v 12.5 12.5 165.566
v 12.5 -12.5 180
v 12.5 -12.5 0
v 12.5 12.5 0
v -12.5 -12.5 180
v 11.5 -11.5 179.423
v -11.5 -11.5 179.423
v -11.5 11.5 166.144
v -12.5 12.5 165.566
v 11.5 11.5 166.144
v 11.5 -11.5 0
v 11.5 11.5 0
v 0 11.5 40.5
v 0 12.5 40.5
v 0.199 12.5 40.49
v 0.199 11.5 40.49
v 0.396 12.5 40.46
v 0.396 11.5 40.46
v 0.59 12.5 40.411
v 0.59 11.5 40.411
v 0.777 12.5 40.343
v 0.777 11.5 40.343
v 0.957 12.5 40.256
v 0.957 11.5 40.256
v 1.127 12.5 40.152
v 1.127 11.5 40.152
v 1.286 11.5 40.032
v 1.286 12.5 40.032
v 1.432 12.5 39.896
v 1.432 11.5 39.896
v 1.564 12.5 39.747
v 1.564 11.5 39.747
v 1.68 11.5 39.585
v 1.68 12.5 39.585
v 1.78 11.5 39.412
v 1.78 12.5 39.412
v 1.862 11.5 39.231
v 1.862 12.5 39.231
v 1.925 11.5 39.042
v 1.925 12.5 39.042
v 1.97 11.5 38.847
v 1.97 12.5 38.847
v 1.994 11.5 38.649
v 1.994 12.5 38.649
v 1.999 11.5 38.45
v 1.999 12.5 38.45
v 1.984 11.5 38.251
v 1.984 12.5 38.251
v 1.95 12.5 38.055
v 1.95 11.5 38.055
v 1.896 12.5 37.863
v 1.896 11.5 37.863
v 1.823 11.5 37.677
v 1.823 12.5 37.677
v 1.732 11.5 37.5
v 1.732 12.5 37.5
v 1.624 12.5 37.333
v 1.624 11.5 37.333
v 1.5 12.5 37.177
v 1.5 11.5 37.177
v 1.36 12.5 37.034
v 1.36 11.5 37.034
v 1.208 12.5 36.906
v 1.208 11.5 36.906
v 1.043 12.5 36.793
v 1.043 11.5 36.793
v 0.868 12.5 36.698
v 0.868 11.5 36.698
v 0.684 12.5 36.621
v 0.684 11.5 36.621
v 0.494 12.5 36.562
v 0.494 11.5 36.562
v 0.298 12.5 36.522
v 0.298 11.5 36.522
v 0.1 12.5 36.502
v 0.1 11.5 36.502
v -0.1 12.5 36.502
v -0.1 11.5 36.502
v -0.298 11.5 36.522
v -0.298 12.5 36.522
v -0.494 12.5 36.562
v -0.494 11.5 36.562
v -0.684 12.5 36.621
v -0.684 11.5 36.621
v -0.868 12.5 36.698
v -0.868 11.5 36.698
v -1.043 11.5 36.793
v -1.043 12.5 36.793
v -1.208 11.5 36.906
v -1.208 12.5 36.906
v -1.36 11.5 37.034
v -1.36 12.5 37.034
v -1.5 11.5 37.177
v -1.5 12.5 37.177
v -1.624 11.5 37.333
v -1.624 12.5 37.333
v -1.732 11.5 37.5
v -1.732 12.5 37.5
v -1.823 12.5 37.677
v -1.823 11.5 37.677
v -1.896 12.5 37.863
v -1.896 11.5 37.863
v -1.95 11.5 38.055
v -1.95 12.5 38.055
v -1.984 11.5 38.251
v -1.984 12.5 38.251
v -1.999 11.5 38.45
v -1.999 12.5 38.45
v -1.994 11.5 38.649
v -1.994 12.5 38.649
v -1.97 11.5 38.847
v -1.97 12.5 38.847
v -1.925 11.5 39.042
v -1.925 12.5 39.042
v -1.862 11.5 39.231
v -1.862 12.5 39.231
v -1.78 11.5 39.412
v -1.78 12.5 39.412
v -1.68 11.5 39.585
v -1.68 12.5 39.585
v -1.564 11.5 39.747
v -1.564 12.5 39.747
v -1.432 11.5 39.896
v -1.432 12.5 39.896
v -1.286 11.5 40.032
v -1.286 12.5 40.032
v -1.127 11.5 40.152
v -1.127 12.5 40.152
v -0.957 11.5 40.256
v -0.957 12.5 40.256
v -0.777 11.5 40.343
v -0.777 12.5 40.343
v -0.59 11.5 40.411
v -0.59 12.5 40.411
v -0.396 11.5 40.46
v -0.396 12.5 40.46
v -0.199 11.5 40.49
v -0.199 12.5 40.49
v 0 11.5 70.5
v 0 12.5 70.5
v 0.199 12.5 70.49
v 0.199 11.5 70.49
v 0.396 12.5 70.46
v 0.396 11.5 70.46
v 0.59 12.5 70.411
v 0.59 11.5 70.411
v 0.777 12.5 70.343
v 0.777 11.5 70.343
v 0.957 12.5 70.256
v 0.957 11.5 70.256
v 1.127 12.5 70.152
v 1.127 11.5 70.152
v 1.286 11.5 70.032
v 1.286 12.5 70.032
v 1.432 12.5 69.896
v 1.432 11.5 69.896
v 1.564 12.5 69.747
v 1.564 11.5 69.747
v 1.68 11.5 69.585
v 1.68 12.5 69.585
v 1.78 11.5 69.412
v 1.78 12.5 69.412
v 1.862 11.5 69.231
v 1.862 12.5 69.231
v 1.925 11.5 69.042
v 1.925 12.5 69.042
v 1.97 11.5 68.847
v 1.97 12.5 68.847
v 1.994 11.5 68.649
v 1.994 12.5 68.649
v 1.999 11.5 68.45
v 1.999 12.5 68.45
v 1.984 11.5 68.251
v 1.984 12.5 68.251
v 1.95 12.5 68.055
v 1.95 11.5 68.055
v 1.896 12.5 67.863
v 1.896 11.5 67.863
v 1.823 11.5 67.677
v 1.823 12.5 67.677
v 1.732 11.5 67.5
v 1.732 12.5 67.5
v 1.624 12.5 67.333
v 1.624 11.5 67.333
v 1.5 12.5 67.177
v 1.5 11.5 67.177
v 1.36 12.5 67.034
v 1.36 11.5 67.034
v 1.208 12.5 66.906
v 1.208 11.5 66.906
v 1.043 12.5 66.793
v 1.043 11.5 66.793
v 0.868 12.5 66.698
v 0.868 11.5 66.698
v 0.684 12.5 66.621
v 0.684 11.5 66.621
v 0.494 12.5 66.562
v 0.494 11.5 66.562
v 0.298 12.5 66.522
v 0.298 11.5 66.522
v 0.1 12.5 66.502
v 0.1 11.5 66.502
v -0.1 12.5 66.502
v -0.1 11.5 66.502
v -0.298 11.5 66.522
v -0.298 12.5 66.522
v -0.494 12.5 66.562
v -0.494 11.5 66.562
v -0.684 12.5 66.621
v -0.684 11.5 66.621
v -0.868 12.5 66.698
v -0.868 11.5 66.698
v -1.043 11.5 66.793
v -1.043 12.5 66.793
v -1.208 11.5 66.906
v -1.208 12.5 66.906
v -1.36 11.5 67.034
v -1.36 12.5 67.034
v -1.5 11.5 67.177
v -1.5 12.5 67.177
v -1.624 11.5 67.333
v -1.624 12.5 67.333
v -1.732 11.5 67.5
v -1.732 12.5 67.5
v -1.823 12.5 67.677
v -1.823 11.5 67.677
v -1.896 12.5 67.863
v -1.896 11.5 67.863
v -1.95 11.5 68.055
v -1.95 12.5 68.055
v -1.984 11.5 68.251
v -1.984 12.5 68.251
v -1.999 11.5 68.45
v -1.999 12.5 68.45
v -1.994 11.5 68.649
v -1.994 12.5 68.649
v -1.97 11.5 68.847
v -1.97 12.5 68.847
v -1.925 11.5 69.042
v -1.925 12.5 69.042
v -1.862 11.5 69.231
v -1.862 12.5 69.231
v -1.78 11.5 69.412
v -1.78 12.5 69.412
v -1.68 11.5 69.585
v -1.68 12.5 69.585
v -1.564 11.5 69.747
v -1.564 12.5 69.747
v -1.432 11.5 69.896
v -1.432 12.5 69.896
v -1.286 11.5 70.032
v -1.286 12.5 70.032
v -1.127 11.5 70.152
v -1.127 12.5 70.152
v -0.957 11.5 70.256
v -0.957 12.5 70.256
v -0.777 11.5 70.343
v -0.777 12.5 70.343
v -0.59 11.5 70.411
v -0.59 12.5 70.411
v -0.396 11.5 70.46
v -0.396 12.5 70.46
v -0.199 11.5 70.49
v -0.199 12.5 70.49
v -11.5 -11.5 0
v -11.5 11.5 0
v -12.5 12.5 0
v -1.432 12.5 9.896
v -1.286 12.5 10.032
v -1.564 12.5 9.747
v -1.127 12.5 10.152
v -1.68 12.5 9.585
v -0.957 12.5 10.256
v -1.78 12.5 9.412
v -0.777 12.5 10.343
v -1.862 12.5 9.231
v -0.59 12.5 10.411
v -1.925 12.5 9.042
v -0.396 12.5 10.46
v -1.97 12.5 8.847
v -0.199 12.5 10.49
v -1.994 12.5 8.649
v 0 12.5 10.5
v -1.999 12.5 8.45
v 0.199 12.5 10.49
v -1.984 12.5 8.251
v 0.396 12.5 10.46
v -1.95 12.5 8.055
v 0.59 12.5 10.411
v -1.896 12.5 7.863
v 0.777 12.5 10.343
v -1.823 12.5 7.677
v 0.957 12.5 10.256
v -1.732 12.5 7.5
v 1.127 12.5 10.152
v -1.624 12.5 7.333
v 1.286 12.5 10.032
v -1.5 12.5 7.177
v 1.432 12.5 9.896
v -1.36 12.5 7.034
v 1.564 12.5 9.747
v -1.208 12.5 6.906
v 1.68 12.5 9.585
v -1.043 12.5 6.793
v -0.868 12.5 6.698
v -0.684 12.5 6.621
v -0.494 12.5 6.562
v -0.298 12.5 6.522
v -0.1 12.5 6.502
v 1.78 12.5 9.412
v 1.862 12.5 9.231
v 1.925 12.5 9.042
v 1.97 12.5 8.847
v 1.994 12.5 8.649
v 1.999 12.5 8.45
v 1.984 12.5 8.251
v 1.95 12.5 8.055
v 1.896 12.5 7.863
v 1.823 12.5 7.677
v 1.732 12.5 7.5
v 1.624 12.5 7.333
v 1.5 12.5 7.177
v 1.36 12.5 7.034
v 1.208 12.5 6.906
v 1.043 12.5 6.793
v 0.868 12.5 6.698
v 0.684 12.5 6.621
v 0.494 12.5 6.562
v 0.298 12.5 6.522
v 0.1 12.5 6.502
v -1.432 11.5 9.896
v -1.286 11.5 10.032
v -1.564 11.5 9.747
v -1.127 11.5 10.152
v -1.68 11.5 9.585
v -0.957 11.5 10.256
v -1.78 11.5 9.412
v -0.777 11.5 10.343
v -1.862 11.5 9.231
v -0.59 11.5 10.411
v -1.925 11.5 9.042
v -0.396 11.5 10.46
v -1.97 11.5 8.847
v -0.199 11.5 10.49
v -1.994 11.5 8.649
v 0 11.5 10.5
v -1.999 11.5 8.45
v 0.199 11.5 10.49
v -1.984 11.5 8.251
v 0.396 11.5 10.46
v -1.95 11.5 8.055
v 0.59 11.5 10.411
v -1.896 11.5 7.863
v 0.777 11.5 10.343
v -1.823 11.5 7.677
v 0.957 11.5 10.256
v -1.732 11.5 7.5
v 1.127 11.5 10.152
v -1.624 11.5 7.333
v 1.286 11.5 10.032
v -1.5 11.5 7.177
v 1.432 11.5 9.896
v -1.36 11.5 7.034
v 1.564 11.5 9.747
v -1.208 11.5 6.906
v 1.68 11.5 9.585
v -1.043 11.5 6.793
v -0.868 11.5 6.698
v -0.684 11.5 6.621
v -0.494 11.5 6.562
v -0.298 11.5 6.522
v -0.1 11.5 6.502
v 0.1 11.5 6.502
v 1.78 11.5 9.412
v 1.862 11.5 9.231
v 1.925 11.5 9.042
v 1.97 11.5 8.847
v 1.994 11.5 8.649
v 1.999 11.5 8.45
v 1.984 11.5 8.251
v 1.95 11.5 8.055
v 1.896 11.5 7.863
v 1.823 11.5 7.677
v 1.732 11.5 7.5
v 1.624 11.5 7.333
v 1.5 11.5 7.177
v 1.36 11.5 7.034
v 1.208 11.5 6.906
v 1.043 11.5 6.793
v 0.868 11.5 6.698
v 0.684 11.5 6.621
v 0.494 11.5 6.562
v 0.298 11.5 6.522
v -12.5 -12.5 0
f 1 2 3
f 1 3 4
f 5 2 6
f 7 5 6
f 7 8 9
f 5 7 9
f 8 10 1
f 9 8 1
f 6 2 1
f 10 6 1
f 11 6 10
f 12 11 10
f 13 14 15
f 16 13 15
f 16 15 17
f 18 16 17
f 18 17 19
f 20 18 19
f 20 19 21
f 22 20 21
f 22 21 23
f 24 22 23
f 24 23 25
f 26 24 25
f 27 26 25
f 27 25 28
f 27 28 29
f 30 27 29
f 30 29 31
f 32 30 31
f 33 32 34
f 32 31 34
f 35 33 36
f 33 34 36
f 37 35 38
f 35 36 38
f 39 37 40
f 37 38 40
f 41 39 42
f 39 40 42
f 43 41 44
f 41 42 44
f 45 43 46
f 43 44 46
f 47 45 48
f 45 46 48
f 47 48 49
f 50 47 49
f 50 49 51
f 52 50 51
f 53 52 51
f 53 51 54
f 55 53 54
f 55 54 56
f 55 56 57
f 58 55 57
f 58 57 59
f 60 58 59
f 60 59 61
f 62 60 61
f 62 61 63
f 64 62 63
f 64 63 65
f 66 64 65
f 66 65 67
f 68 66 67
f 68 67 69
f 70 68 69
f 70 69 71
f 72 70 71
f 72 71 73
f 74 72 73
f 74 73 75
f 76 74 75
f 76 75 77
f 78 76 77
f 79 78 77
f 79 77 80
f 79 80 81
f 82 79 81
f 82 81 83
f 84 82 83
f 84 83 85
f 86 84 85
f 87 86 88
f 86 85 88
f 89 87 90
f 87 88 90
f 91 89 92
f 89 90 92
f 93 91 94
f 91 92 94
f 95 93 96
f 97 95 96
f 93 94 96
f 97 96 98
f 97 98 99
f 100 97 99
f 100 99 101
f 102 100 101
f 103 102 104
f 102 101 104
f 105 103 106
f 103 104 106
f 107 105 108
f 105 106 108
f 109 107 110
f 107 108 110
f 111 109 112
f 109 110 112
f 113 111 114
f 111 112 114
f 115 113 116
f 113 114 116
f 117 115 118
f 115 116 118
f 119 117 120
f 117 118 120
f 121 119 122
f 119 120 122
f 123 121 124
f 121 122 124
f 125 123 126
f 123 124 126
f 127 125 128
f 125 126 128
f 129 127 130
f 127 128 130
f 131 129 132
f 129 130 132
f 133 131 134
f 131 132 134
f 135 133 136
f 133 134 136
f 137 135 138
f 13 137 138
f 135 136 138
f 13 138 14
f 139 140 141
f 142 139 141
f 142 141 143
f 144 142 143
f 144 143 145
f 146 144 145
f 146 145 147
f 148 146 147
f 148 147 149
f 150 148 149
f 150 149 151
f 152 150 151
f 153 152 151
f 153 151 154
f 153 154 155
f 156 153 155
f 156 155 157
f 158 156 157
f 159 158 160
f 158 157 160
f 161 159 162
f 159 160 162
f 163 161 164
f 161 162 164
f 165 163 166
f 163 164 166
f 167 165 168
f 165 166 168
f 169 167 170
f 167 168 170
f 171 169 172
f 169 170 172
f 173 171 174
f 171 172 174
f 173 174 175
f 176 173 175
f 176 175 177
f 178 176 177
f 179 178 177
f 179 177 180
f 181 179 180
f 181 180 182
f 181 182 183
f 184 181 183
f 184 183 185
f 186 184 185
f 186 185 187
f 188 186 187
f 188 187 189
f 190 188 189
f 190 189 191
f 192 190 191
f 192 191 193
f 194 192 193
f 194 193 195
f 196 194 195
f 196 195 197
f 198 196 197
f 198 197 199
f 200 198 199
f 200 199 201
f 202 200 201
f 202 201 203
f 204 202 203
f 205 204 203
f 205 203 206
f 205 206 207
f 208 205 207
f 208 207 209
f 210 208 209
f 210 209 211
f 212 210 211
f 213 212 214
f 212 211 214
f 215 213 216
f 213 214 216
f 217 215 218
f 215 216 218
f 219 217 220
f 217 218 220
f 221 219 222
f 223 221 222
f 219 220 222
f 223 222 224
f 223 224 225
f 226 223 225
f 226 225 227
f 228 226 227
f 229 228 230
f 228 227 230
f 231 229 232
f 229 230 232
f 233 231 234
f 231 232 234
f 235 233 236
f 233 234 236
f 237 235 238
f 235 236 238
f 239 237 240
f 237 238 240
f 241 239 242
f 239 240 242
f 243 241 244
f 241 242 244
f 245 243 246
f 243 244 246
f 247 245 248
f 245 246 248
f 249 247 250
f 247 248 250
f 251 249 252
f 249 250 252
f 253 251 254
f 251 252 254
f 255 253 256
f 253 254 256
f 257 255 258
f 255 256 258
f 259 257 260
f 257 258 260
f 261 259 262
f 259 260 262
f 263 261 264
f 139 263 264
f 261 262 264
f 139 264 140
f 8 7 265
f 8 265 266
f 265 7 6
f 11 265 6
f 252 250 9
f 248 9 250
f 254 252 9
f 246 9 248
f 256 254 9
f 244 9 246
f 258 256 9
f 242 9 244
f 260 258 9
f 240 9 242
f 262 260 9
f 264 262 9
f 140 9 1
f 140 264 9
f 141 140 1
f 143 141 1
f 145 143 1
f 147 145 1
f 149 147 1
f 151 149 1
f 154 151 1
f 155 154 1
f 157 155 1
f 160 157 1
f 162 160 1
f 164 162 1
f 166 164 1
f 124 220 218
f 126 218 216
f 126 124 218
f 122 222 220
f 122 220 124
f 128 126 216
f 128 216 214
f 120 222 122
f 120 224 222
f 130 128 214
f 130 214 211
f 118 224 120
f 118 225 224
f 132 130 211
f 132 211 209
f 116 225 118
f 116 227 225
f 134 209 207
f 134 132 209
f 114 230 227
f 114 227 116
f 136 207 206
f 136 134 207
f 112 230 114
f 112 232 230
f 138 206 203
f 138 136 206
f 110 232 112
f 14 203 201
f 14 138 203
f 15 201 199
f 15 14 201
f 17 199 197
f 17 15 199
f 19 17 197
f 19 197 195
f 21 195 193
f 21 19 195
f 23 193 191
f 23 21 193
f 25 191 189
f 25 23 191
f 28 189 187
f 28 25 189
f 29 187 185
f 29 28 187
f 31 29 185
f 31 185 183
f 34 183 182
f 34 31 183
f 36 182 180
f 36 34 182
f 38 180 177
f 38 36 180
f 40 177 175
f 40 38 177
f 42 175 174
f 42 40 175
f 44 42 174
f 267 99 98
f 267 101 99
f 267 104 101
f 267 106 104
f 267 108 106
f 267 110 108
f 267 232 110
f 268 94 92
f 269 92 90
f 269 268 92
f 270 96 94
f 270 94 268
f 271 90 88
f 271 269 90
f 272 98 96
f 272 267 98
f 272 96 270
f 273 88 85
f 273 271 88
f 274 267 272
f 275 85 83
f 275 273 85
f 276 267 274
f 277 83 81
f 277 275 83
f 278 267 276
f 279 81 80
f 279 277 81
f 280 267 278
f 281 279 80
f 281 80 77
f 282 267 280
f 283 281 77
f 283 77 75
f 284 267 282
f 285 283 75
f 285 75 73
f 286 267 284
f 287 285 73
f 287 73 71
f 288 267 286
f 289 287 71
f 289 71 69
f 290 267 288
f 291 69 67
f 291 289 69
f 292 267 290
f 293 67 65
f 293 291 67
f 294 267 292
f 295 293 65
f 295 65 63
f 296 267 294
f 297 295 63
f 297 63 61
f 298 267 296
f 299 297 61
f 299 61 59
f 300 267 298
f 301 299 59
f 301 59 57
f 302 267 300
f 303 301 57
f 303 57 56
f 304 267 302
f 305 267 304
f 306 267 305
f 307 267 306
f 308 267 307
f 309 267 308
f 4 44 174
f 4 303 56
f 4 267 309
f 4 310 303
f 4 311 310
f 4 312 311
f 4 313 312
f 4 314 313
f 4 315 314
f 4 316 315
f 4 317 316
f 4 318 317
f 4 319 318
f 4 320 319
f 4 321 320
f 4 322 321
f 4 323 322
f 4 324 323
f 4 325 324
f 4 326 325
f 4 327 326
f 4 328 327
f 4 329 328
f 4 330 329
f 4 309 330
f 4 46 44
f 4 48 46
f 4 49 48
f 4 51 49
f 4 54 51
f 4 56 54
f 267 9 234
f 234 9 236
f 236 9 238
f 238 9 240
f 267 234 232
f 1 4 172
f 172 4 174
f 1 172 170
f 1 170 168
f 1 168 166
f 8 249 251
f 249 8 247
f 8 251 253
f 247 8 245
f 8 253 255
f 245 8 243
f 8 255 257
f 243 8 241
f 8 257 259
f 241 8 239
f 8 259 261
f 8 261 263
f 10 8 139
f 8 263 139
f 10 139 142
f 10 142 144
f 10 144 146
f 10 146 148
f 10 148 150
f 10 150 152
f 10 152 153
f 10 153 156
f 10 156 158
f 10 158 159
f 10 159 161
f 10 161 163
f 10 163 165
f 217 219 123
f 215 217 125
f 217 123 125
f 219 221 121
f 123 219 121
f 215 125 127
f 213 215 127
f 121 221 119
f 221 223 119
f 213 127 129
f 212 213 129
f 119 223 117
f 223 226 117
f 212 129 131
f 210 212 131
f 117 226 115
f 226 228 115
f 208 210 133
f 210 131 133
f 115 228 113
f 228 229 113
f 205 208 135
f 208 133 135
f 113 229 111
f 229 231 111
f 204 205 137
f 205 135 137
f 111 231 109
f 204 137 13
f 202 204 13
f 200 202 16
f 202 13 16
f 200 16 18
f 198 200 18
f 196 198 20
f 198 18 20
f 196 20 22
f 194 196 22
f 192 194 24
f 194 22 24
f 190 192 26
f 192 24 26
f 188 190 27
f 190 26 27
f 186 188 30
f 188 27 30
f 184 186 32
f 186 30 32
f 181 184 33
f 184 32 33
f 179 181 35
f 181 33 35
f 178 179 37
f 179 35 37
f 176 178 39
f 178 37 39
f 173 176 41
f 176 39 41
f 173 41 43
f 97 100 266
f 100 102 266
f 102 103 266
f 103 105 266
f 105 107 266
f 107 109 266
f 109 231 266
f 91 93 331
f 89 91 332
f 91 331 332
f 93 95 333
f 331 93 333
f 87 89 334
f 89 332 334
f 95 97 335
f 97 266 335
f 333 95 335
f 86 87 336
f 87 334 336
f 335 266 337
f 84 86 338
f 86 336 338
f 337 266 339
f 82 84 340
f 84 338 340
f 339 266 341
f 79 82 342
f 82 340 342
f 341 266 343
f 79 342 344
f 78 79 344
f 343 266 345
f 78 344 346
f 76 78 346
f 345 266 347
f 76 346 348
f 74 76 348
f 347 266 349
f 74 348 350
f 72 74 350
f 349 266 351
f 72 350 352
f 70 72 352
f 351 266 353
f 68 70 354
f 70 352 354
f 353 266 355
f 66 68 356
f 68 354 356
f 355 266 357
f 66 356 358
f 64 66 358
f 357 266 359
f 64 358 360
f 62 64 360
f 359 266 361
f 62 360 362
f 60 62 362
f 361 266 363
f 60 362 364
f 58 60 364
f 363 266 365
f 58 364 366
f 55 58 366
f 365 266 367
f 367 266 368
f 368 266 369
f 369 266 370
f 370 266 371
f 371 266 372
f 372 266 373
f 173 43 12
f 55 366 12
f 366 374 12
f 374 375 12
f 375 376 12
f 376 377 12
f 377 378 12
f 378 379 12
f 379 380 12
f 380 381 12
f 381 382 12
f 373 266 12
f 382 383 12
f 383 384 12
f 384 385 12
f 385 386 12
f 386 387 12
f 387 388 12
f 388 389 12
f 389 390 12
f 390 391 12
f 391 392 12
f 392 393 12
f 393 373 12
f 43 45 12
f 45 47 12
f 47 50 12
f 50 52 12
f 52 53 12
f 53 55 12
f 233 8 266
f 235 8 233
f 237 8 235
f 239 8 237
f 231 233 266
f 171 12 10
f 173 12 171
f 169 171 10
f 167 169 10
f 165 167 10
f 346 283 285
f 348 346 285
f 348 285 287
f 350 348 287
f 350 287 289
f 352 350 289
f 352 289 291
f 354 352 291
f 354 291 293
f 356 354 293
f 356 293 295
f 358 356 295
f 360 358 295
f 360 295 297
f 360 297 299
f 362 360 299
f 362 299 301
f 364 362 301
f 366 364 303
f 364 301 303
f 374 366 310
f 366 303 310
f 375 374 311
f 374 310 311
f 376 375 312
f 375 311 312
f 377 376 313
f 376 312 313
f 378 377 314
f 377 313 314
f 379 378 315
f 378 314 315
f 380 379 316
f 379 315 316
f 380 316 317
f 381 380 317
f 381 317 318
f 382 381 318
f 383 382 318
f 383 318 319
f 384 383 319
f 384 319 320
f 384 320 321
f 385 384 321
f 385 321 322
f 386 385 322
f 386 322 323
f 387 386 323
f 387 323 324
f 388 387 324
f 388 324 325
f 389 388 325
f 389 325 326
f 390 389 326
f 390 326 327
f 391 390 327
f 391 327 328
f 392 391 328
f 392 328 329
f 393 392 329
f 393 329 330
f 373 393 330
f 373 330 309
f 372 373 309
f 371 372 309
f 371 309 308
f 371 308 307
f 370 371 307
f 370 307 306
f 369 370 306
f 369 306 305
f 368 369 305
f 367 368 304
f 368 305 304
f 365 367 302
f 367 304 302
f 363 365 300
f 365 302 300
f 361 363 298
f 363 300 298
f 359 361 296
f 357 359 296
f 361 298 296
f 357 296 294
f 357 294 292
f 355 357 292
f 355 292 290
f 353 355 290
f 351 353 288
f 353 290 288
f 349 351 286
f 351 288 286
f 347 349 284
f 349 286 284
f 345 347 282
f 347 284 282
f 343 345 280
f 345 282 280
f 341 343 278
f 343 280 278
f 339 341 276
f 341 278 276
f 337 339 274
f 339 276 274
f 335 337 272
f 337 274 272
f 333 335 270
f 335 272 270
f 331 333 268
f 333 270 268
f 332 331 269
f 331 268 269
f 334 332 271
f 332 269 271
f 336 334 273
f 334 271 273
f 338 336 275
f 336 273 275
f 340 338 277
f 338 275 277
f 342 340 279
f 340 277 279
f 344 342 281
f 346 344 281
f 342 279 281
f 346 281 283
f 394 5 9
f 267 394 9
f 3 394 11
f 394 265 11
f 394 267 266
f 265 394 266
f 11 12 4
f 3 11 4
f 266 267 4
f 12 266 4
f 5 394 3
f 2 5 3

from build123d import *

# Parameters (mm, degrees)
SKETCH1_W           = 25
SKETCH1_H           = 25
SKETCH1_W_2         = 23
SKETCH1_H_2         = 23
BOSS_EXTRUDE1_DEPTH = 180
CUT_EXTRUDE1_DEPTH  = 183.157212319
CUT_EXTRUDE2_REACH  = 184.157
SKETCH3_R           = 2


with BuildPart() as part:
    # Sketch1 → Boss-Extrude1 (new body)
    with BuildSketch(Plane.XY):
        Rectangle(SKETCH1_W, SKETCH1_H)
        Rectangle(SKETCH1_W_2, SKETCH1_H_2, mode=Mode.SUBTRACT)
    extrude(amount=BOSS_EXTRUDE1_DEPTH)

    # Sketch2 → Cut-Extrude1 (cut, through all)
    with BuildSketch(Plane(origin=(12.5, 0, 0), x_dir=(0, 0, -1), z_dir=(1, 0, 0))):
        Polygon((-180, -12.5), (-165.56624327, 12.5), (-180, 12.5), align=None)
    extrude(amount=-CUT_EXTRUDE1_DEPTH, mode=Mode.SUBTRACT)

    # Sketch3 → Cut-Extrude2 (cut, up to next)
    with BuildSketch(Plane(origin=(0, 12.5, 0), x_dir=(1, 0, 0), z_dir=(0, 1, 0)), mode=Mode.PRIVATE) as cut_extrude2_sk1:
        with Locations(Location((0, -8.5, 0), (0, 0, 270))):
            Circle(SKETCH3_R)
    cut_extrude2_tool1 = extrude(cut_extrude2_sk1.sketch, amount=-CUT_EXTRUDE2_REACH, mode=Mode.PRIVATE) & part.part
    # Sketch3 → Cut-Extrude2 (cut, up to next)
    with BuildSketch(Plane(origin=(0, 12.5, 0), x_dir=(1, 0, 0), z_dir=(0, 1, 0)), mode=Mode.PRIVATE) as cut_extrude2_sk2:
        with Locations(Location((0, -38.5, 0), (0, 0, 270))):
            Circle(SKETCH3_R)
    cut_extrude2_tool2 = extrude(cut_extrude2_sk2.sketch, amount=-CUT_EXTRUDE2_REACH, mode=Mode.PRIVATE) & part.part
    # Sketch3 → Cut-Extrude2 (cut, up to next)
    with BuildSketch(Plane(origin=(0, 12.5, 0), x_dir=(1, 0, 0), z_dir=(0, 1, 0)), mode=Mode.PRIVATE) as cut_extrude2_sk3:
        with Locations(Location((0, -68.5, 0), (0, 0, 270))):
            Circle(SKETCH3_R)
    cut_extrude2_tool3 = extrude(cut_extrude2_sk3.sketch, amount=-CUT_EXTRUDE2_REACH, mode=Mode.PRIVATE) & part.part
    add(cut_extrude2_tool1.solids().sort_by_distance((0, 12.5, 8.5))[0], mode=Mode.SUBTRACT)
    add(cut_extrude2_tool2.solids().sort_by_distance((0, 12.5, 38.5))[0], mode=Mode.SUBTRACT)
    add(cut_extrude2_tool3.solids().sort_by_distance((0, 12.5, 68.5))[0], mode=Mode.SUBTRACT)


solid = part.part
